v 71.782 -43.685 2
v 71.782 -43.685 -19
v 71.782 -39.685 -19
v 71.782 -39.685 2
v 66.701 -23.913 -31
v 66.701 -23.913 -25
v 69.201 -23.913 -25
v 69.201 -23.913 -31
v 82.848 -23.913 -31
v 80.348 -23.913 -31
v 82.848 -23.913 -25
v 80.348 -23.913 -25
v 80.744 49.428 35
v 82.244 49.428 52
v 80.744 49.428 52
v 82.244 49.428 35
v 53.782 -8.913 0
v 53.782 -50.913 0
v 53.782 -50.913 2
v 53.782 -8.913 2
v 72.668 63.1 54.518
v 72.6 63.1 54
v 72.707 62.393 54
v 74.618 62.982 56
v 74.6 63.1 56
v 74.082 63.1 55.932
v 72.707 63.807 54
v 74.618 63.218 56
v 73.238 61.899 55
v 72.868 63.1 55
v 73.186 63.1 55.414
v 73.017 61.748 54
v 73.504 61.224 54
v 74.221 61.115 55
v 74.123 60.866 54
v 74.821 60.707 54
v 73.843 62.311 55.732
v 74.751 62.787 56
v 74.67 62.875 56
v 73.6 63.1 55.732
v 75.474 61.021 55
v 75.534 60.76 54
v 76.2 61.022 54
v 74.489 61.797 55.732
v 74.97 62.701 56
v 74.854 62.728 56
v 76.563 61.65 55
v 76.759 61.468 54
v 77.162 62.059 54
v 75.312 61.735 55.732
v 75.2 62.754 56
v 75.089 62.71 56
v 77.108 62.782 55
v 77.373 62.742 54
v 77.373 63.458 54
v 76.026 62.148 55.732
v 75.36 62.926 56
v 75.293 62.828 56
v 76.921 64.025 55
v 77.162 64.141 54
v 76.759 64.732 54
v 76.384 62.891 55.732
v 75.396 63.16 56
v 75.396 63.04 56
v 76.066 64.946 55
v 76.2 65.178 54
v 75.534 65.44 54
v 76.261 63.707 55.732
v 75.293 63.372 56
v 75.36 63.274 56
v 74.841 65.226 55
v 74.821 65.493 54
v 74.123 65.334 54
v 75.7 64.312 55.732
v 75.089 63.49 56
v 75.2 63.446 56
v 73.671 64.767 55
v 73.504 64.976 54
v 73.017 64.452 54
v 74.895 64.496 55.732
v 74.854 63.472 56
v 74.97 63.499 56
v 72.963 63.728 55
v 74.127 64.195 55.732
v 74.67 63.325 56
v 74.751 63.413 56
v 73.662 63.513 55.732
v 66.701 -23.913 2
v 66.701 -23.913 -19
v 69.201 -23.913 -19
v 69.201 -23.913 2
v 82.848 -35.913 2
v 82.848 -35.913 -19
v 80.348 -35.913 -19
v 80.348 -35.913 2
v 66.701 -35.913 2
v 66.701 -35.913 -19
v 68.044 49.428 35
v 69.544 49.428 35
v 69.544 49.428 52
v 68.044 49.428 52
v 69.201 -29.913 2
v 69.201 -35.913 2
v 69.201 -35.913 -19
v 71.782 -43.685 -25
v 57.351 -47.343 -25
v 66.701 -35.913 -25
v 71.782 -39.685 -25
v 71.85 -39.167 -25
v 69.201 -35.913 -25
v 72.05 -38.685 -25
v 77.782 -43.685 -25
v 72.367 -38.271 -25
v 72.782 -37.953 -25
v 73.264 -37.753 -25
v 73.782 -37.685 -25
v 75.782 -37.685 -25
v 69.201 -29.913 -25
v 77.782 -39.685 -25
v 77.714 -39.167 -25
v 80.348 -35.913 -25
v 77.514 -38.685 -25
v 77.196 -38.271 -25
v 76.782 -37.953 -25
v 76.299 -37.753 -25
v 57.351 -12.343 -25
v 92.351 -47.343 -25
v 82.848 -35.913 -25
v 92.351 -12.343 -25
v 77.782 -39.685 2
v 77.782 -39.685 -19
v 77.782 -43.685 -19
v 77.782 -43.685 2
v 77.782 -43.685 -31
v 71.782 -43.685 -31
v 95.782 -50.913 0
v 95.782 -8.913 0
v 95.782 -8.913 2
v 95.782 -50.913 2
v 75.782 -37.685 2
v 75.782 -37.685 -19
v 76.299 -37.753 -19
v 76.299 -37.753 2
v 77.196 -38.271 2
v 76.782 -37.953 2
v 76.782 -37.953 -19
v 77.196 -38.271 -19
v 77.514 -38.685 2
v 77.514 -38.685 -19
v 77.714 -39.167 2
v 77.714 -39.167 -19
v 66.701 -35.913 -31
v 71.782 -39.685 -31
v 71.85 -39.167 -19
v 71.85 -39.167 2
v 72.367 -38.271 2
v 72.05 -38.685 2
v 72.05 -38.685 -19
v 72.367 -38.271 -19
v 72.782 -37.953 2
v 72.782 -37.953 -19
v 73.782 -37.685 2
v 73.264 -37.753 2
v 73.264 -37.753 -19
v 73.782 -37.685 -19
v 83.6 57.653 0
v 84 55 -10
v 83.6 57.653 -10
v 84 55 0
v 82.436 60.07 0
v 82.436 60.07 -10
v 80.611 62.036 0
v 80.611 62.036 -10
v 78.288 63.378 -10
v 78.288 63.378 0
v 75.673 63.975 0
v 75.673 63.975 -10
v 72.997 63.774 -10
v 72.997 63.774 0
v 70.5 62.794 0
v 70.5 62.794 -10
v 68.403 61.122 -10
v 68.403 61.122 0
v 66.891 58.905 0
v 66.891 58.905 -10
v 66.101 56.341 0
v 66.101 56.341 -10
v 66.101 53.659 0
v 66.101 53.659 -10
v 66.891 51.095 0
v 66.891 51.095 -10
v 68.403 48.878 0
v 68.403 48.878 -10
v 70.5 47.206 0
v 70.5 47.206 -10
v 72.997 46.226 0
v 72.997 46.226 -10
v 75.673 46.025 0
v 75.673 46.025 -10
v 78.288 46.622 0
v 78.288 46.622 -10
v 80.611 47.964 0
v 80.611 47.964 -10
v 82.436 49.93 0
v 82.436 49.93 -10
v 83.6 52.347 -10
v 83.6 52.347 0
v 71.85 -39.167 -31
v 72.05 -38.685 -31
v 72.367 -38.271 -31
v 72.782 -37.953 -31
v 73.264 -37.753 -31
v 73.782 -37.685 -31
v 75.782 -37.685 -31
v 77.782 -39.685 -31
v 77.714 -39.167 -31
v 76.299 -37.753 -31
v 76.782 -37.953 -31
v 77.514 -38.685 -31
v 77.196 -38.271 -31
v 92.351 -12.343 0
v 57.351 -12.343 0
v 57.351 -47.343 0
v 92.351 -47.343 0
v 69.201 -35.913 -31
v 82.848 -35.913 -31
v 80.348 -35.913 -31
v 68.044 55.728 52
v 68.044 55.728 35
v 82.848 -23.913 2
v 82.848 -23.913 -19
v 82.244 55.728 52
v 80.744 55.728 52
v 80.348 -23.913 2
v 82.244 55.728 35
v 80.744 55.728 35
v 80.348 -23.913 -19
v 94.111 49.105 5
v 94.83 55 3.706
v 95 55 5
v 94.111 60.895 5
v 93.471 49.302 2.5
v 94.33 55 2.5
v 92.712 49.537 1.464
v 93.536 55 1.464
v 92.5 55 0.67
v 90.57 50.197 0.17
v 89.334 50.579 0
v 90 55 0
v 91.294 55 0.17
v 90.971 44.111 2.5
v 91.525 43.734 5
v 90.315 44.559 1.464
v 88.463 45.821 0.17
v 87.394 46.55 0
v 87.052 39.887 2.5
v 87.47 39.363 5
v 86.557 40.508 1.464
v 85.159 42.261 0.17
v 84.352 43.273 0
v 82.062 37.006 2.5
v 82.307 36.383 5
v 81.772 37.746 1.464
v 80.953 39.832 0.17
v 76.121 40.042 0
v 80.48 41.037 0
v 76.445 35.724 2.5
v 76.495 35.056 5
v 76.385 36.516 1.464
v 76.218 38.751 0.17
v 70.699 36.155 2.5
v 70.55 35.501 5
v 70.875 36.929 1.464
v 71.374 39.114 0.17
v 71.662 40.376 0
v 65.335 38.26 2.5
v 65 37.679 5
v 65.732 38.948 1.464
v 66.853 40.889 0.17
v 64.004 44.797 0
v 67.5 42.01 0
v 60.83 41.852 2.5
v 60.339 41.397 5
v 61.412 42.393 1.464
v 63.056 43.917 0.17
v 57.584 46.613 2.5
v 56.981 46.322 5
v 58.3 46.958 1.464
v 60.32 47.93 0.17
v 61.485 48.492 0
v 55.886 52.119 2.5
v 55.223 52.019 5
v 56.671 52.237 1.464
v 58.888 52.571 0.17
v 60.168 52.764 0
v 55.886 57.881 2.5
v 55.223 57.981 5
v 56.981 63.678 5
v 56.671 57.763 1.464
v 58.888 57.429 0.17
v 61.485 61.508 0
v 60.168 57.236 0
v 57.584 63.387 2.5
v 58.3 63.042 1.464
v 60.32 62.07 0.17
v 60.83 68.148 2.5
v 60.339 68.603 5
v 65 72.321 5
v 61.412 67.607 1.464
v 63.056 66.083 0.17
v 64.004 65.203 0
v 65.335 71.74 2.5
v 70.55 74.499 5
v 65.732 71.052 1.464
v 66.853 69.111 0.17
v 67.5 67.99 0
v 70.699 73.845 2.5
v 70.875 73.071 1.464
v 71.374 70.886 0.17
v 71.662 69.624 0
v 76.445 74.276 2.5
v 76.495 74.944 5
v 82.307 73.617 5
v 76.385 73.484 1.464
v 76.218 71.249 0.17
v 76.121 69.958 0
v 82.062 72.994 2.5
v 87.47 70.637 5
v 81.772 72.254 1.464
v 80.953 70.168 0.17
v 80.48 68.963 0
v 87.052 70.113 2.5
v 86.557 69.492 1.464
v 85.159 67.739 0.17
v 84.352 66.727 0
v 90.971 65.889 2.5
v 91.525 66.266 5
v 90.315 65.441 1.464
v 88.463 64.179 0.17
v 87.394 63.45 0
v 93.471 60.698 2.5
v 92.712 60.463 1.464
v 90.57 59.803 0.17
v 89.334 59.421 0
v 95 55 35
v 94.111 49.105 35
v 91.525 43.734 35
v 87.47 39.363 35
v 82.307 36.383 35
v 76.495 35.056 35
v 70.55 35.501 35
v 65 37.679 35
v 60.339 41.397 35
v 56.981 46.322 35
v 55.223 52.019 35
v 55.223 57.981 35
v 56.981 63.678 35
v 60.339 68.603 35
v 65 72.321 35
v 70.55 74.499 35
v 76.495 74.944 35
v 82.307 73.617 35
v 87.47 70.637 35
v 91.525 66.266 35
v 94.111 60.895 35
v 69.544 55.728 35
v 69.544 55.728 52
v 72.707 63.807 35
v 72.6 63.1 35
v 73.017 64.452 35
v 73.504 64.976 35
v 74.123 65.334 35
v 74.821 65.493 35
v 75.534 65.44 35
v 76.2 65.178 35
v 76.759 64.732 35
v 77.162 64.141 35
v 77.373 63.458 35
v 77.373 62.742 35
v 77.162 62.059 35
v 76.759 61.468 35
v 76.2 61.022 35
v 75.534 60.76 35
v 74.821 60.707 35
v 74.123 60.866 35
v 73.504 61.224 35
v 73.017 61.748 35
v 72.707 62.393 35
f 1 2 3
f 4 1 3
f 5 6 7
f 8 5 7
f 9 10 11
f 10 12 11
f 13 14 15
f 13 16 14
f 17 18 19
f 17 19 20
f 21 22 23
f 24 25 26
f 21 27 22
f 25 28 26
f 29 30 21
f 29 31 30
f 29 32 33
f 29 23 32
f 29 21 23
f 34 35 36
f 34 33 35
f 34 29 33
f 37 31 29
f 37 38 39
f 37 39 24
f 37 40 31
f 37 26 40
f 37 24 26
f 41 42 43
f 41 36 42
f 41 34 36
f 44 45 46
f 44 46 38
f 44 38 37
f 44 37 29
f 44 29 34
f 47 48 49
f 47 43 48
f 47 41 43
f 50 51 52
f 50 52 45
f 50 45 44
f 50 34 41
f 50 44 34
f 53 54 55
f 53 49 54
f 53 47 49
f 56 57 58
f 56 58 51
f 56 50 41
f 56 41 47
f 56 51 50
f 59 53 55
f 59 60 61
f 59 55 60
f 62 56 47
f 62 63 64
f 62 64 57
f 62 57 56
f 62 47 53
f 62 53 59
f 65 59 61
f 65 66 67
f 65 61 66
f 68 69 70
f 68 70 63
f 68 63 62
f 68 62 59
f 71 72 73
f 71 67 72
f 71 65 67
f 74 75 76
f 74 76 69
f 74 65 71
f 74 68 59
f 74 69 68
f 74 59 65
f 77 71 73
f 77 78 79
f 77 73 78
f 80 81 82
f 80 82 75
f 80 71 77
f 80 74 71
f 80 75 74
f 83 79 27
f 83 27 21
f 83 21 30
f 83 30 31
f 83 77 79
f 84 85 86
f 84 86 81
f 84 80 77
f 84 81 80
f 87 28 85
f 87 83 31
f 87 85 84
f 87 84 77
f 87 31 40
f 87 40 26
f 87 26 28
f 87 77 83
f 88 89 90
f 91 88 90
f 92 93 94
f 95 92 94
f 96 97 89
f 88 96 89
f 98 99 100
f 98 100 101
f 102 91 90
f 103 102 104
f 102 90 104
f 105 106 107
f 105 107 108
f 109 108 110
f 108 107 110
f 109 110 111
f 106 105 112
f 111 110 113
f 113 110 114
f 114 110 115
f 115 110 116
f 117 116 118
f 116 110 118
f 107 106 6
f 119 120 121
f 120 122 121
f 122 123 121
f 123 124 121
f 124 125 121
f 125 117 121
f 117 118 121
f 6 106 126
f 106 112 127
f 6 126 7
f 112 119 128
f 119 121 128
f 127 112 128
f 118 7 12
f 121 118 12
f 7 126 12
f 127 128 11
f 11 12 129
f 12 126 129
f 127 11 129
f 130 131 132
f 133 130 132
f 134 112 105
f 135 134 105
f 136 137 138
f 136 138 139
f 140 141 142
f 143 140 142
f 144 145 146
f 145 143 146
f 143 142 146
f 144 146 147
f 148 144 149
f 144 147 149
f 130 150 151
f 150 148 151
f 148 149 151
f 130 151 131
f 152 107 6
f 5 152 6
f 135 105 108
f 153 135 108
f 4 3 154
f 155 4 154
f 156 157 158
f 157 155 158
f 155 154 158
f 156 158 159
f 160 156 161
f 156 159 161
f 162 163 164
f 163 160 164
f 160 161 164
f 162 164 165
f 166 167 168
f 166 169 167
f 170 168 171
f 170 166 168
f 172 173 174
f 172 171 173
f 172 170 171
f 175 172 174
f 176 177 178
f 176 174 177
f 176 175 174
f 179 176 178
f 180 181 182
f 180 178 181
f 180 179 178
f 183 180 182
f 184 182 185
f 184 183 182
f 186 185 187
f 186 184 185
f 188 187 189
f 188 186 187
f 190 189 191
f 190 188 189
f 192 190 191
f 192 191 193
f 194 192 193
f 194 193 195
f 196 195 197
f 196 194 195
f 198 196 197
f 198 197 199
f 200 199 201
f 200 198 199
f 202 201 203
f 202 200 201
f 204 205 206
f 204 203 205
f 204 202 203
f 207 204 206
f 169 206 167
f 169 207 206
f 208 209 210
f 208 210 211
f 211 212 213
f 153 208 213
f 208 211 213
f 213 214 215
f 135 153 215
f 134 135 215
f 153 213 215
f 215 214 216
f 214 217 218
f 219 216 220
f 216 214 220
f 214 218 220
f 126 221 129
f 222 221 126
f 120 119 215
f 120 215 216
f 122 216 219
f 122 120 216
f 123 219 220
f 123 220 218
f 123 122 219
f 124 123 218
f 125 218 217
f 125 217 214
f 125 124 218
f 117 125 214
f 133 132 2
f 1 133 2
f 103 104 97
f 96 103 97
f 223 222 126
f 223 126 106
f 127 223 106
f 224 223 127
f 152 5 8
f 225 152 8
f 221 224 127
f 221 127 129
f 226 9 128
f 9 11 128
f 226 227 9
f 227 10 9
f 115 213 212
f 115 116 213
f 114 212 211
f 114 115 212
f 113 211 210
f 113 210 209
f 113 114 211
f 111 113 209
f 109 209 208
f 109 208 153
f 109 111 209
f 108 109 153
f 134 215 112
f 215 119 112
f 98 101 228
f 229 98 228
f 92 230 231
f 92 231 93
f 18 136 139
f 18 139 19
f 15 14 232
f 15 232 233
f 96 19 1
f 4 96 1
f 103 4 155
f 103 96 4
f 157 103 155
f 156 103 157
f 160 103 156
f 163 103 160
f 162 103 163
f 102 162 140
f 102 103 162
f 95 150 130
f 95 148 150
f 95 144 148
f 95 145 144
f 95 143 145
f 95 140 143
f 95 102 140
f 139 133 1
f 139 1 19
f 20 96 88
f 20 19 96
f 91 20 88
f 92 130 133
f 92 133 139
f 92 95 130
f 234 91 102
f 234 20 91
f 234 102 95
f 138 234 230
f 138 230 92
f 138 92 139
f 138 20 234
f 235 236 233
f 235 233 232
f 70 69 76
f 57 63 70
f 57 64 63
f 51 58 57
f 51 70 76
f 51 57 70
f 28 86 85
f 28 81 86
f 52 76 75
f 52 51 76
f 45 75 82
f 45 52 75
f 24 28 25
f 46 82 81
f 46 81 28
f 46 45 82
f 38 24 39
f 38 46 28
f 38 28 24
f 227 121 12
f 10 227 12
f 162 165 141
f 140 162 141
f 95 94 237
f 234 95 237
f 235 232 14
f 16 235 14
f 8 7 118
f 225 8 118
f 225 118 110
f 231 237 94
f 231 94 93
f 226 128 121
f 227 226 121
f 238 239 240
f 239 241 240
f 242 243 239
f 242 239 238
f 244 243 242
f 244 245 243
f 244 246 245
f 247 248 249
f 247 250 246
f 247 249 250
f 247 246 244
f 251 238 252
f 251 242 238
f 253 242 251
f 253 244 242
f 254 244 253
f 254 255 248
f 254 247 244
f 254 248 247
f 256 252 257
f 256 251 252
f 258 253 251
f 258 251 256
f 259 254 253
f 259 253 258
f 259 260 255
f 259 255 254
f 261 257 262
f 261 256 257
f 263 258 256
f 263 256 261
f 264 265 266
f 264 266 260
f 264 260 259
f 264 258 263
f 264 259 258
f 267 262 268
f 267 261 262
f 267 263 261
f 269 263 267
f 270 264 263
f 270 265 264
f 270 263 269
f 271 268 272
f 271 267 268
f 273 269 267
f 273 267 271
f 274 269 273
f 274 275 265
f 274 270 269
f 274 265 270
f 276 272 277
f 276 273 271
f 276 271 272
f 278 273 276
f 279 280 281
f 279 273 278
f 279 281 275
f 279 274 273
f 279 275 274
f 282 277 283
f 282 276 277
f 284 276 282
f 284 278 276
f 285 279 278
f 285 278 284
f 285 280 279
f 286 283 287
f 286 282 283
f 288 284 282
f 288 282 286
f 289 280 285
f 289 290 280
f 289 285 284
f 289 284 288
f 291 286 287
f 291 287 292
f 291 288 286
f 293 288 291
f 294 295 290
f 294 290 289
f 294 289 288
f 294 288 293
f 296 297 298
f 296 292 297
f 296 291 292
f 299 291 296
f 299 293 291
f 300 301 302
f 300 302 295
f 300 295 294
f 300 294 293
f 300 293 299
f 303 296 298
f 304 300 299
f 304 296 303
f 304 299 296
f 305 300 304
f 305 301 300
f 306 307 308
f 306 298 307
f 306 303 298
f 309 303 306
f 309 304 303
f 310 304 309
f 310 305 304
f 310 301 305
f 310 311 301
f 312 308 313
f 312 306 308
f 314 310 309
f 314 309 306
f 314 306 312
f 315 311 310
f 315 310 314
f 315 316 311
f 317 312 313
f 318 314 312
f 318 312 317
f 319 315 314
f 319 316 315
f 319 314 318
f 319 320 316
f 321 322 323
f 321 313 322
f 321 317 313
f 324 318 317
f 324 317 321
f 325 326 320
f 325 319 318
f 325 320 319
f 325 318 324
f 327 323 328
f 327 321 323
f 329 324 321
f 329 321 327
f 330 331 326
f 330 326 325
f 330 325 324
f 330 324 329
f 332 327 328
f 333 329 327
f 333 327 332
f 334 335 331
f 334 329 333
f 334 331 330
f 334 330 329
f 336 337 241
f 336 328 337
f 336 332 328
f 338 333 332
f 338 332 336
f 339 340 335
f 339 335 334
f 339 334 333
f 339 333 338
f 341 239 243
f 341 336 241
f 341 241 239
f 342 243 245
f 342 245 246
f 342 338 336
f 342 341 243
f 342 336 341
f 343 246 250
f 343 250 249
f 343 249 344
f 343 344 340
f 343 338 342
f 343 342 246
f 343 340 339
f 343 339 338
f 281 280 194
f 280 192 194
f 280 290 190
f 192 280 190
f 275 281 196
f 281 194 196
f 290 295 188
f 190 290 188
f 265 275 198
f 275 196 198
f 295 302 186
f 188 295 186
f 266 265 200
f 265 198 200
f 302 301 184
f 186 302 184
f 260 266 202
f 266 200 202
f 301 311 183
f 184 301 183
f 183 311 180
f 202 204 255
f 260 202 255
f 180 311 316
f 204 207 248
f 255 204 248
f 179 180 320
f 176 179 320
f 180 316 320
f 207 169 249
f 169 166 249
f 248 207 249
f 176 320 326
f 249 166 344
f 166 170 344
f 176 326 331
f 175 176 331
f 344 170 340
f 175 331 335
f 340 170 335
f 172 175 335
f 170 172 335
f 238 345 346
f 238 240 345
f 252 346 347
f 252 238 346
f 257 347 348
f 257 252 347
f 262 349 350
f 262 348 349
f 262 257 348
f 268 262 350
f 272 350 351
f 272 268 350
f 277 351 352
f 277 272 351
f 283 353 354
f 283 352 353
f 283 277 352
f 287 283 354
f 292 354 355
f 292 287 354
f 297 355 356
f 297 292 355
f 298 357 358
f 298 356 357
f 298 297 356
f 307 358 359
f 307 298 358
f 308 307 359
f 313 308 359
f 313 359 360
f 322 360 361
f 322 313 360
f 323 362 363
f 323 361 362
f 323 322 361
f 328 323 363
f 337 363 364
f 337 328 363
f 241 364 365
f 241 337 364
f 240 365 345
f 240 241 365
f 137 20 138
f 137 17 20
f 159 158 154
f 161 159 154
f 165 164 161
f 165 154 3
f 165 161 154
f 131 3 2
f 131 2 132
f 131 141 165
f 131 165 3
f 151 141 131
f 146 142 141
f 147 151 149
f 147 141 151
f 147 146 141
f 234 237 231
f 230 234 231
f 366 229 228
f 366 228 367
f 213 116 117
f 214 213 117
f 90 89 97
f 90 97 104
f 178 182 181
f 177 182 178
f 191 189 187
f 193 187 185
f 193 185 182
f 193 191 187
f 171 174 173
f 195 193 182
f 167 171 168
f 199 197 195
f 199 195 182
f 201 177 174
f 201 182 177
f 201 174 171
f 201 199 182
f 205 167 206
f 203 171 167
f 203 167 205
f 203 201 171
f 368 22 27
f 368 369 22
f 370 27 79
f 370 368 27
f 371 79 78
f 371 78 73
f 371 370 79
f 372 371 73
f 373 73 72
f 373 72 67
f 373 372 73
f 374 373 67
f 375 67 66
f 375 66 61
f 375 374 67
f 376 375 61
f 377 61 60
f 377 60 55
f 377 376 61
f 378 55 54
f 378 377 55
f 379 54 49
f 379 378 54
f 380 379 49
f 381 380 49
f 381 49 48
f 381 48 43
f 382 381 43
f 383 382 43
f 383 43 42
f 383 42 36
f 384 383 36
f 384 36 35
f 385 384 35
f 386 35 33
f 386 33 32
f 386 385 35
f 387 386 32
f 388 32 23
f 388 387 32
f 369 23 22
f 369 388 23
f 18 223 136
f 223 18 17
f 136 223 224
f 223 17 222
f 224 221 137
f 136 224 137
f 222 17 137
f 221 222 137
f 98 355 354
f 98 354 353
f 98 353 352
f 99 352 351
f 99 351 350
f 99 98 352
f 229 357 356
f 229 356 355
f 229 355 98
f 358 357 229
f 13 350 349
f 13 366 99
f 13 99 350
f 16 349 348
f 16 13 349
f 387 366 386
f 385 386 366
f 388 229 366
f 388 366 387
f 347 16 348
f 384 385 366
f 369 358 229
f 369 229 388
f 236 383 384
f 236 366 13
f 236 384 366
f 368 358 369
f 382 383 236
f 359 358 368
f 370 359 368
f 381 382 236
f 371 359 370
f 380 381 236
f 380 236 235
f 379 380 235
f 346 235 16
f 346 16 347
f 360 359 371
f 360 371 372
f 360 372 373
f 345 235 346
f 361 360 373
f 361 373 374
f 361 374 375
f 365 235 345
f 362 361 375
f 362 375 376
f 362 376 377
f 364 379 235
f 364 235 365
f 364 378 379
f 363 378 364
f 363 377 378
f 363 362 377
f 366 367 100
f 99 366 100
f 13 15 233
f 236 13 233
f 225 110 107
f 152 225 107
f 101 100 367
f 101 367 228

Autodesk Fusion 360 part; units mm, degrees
sketch "Boceto1" plane through (0, 0, 0) normal (0, 0, 1) x (1, 0, 0)
  circle A0 centre (75, 55) radius 20
  dimension "d1" = 40
extrude "Extruir1" add sketch "Boceto1" along normal blind 35 makes body 1
fillet "Empalme1" radius 5 1 faces at (63.8127, 57.6911, 0) on bodies 1
sketch "Boceto2" plane through (0, 0, 35) normal (0, 0, 1) x (-1, 0, 0)
  circle A0 centre (-75, -55) radius 20
  circle A1 centre (-75, -63.1) radius 2.4
  line L0 (-75, -75) -> (-75, -63.1)
  line L1 (-80.7445, -55.7276) -> (-82.2445, -55.7276)
  line L2 (-82.2445, -55.7276) -> (-82.2445, -49.4276)
  line L3 (-82.2445, -49.4276) -> (-80.7445, -49.4276)
  line L4 (-80.7445, -49.4276) -> (-80.7445, -55.7276)
  line L5 (-80.7445, -55.7276) -> (-82.2445, -49.4276) construction
  line L6 (-82.2445, -55.7276) -> (-80.7445, -49.4276) construction
  line L7 (-81.4945, -52.5776) -> (-68.7945, -52.5776)
  line L8 (-68.0445, -55.7276) -> (-69.5445, -55.7276)
  line L9 (-69.5445, -55.7276) -> (-69.5445, -49.4276)
  line L10 (-69.5445, -49.4276) -> (-68.0445, -49.4276)
  line L11 (-68.0445, -49.4276) -> (-68.0445, -55.7276)
  line L12 (-68.0445, -55.7276) -> (-69.5445, -49.4276) construction
  line L13 (-69.5445, -55.7276) -> (-68.0445, -49.4276) construction
  line L14 (-75, -35) -> (-75, -56.7166)
  point P0 (-81.4945, -52.5776)
  point P1 (-68.7945, -52.5776)
  dimension "d6" = 4.8
  dimension "d7" = 11.9
  dimension "d8" = 1.5
  dimension "d9" = 6.3
  dimension "d10" = 12.7
  dimension "d11" = 1.5
  dimension "d12" = 6.3
extrude "Extruir2" add sketch "Boceto2" along normal blind 17 contours L8 L9 L10 L11 | L1 L2 L3 L4 bodies 1
extrude "Extruir3" add sketch "Boceto2" along normal blind 21 contours A1 bodies 1
fillet "Empalme2" radius 2 1 faces at (74.5012, 62.0029, 56) on bodies 1
sketch "Boceto3" plane through (0, 0, 0) normal (0, 0, -1) x (1, 0, 0)
  circle A0 centre (75, -55) radius 15
  circle A1 centre (75, -55) radius 9
  dimension "d19" = 18
extrude "Extruir4" add sketch "Boceto3" along normal blind 10 contours A1 bodies 1
sketch "Boceto10" plane through (0, 0, 0) normal (0, 0, 1) x (1, 0, 0)
  line L0 (95.7817, -50.9127) -> (53.7817, -50.9127)
  line L1 (53.7817, -50.9127) -> (53.7817, -8.9127)
  line L2 (53.7817, -8.9127) -> (95.7817, -8.9127)
  line L3 (95.7817, -8.9127) -> (95.7817, -50.9127)
  line L4 (95.7817, -50.9127) -> (53.7817, -8.9127) construction
  line L5 (53.7817, -50.9127) -> (95.7817, -8.9127) construction
  line L6 (74.7817, -8.9127) -> (74.7817, -29.9127)
  line L7 (95.7817, -29.9127) -> (74.7817, -29.9127)
  line L8 (85.2817, -29.9127) -> (85.2817, -8.9127)
  line L9 (85.2817, -29.9127) -> (65, -29.9127)
  line L10 (69.201, -35.9127) -> (66.701, -35.9127)
  line L11 (66.701, -35.9127) -> (66.701, -23.9127)
  line L12 (66.701, -23.9127) -> (69.201, -23.9127)
  line L13 (69.201, -23.9127) -> (69.201, -35.9127)
  line L14 (69.201, -35.9127) -> (66.701, -23.9127) construction
  line L15 (66.701, -35.9127) -> (69.201, -23.9127) construction
  line L16 (80.3485, -23.9127) -> (82.8485, -23.9127)
  line L17 (82.8485, -23.9127) -> (82.8485, -35.9127)
  line L18 (82.8485, -35.9127) -> (80.3485, -35.9127)
  line L19 (80.3485, -35.9127) -> (80.3485, -23.9127)
  line L20 (80.3485, -23.9127) -> (82.8485, -35.9127) construction
  line L21 (82.8485, -23.9127) -> (80.3485, -35.9127) construction
  line L22 (77.7817, -43.6849) -> (71.7817, -43.6849)
  line L23 (71.7817, -43.6849) -> (71.7817, -39.6849)
  line L24 (73.7817, -37.6849) -> (75.7817, -37.6849)
  line L25 (77.7817, -39.6849) -> (77.7817, -43.6849)
  line L26 (77.7817, -43.6849) -> (71.7817, -37.6849) construction
  line L27 (71.7817, -43.6849) -> (77.7817, -37.6849) construction
  arc A0 (73.7817, -37.6849) -> (71.7817, -39.6849) centre (73.7817, -39.6849) ccw
  arc A1 (77.7817, -39.6849) -> (75.7817, -37.6849) centre (75.7817, -39.6849) ccw
  line L28 (57.3512, -47.3433) -> (92.3512, -47.3433)
  line L29 (92.3512, -47.3433) -> (92.3512, -12.3433)
  line L30 (92.3512, -12.3433) -> (57.3512, -12.3433)
  line L31 (57.3512, -12.3433) -> (57.3512, -47.3433)
  point P0 (74.7817, -29.9127)
  point P1 (67.951, -29.9127)
  point P2 (81.5985, -29.9127)
  point P3 (74.7817, -40.6849)
  dimension "d56" = 42
  dimension "d57" = 42
  dimension "d58" = 2.5
  dimension "d59" = 12
  dimension "d60" = 2.5
  dimension "d61" = 12
  dimension "d62" = 6
  dimension "d63" = 6
  dimension "d64" = 2
  dimension "d65" = 2
  dimension "d68" = 35
  dimension "d69" = 35
extrude "Extruir11" add sketch "Boceto10" along normal blind 2 separate body contours L0 L1 L2 L3 L6 L7 L28 L29 L30 L31 | L2 L3 L7 L8 L29 L30 | L6 L7 L9 L17 L18 L19 L28 L29 L30 L31 | L7 L8 L29 L30 | L2 L6 L8 L30 | L6 L7 L8 L9 L16 L17 L19 L30 makes body 2
extrude "Extruir12" add sketch "Boceto10" against normal blind 25 separate body contours L6 L7 L9 L17 L18 L19 L28 L29 L30 L31 | L7 L8 L29 L30 | L6 L7 L8 L9 L16 L17 L19 L30 makes body 3
extrude "Extruir13" add sketch "Boceto10" against normal blind 31 contours L9 L10 L11 L13 | L9 L11 L12 L13 | L7 L9 L17 L18 L19 | L7 L9 L16 L17 L19 | L22 L23 L24 L25 A0 A1 bodies 2 3
extrude "Extruir14" cut 3 faces at (68.3677, -27.9127, 0) (81.1819, -27.9127, 0) (75.7817, -42.3516, 0) along direction (0, 0, -1) blind 19 on bodies 2 bodies 2
